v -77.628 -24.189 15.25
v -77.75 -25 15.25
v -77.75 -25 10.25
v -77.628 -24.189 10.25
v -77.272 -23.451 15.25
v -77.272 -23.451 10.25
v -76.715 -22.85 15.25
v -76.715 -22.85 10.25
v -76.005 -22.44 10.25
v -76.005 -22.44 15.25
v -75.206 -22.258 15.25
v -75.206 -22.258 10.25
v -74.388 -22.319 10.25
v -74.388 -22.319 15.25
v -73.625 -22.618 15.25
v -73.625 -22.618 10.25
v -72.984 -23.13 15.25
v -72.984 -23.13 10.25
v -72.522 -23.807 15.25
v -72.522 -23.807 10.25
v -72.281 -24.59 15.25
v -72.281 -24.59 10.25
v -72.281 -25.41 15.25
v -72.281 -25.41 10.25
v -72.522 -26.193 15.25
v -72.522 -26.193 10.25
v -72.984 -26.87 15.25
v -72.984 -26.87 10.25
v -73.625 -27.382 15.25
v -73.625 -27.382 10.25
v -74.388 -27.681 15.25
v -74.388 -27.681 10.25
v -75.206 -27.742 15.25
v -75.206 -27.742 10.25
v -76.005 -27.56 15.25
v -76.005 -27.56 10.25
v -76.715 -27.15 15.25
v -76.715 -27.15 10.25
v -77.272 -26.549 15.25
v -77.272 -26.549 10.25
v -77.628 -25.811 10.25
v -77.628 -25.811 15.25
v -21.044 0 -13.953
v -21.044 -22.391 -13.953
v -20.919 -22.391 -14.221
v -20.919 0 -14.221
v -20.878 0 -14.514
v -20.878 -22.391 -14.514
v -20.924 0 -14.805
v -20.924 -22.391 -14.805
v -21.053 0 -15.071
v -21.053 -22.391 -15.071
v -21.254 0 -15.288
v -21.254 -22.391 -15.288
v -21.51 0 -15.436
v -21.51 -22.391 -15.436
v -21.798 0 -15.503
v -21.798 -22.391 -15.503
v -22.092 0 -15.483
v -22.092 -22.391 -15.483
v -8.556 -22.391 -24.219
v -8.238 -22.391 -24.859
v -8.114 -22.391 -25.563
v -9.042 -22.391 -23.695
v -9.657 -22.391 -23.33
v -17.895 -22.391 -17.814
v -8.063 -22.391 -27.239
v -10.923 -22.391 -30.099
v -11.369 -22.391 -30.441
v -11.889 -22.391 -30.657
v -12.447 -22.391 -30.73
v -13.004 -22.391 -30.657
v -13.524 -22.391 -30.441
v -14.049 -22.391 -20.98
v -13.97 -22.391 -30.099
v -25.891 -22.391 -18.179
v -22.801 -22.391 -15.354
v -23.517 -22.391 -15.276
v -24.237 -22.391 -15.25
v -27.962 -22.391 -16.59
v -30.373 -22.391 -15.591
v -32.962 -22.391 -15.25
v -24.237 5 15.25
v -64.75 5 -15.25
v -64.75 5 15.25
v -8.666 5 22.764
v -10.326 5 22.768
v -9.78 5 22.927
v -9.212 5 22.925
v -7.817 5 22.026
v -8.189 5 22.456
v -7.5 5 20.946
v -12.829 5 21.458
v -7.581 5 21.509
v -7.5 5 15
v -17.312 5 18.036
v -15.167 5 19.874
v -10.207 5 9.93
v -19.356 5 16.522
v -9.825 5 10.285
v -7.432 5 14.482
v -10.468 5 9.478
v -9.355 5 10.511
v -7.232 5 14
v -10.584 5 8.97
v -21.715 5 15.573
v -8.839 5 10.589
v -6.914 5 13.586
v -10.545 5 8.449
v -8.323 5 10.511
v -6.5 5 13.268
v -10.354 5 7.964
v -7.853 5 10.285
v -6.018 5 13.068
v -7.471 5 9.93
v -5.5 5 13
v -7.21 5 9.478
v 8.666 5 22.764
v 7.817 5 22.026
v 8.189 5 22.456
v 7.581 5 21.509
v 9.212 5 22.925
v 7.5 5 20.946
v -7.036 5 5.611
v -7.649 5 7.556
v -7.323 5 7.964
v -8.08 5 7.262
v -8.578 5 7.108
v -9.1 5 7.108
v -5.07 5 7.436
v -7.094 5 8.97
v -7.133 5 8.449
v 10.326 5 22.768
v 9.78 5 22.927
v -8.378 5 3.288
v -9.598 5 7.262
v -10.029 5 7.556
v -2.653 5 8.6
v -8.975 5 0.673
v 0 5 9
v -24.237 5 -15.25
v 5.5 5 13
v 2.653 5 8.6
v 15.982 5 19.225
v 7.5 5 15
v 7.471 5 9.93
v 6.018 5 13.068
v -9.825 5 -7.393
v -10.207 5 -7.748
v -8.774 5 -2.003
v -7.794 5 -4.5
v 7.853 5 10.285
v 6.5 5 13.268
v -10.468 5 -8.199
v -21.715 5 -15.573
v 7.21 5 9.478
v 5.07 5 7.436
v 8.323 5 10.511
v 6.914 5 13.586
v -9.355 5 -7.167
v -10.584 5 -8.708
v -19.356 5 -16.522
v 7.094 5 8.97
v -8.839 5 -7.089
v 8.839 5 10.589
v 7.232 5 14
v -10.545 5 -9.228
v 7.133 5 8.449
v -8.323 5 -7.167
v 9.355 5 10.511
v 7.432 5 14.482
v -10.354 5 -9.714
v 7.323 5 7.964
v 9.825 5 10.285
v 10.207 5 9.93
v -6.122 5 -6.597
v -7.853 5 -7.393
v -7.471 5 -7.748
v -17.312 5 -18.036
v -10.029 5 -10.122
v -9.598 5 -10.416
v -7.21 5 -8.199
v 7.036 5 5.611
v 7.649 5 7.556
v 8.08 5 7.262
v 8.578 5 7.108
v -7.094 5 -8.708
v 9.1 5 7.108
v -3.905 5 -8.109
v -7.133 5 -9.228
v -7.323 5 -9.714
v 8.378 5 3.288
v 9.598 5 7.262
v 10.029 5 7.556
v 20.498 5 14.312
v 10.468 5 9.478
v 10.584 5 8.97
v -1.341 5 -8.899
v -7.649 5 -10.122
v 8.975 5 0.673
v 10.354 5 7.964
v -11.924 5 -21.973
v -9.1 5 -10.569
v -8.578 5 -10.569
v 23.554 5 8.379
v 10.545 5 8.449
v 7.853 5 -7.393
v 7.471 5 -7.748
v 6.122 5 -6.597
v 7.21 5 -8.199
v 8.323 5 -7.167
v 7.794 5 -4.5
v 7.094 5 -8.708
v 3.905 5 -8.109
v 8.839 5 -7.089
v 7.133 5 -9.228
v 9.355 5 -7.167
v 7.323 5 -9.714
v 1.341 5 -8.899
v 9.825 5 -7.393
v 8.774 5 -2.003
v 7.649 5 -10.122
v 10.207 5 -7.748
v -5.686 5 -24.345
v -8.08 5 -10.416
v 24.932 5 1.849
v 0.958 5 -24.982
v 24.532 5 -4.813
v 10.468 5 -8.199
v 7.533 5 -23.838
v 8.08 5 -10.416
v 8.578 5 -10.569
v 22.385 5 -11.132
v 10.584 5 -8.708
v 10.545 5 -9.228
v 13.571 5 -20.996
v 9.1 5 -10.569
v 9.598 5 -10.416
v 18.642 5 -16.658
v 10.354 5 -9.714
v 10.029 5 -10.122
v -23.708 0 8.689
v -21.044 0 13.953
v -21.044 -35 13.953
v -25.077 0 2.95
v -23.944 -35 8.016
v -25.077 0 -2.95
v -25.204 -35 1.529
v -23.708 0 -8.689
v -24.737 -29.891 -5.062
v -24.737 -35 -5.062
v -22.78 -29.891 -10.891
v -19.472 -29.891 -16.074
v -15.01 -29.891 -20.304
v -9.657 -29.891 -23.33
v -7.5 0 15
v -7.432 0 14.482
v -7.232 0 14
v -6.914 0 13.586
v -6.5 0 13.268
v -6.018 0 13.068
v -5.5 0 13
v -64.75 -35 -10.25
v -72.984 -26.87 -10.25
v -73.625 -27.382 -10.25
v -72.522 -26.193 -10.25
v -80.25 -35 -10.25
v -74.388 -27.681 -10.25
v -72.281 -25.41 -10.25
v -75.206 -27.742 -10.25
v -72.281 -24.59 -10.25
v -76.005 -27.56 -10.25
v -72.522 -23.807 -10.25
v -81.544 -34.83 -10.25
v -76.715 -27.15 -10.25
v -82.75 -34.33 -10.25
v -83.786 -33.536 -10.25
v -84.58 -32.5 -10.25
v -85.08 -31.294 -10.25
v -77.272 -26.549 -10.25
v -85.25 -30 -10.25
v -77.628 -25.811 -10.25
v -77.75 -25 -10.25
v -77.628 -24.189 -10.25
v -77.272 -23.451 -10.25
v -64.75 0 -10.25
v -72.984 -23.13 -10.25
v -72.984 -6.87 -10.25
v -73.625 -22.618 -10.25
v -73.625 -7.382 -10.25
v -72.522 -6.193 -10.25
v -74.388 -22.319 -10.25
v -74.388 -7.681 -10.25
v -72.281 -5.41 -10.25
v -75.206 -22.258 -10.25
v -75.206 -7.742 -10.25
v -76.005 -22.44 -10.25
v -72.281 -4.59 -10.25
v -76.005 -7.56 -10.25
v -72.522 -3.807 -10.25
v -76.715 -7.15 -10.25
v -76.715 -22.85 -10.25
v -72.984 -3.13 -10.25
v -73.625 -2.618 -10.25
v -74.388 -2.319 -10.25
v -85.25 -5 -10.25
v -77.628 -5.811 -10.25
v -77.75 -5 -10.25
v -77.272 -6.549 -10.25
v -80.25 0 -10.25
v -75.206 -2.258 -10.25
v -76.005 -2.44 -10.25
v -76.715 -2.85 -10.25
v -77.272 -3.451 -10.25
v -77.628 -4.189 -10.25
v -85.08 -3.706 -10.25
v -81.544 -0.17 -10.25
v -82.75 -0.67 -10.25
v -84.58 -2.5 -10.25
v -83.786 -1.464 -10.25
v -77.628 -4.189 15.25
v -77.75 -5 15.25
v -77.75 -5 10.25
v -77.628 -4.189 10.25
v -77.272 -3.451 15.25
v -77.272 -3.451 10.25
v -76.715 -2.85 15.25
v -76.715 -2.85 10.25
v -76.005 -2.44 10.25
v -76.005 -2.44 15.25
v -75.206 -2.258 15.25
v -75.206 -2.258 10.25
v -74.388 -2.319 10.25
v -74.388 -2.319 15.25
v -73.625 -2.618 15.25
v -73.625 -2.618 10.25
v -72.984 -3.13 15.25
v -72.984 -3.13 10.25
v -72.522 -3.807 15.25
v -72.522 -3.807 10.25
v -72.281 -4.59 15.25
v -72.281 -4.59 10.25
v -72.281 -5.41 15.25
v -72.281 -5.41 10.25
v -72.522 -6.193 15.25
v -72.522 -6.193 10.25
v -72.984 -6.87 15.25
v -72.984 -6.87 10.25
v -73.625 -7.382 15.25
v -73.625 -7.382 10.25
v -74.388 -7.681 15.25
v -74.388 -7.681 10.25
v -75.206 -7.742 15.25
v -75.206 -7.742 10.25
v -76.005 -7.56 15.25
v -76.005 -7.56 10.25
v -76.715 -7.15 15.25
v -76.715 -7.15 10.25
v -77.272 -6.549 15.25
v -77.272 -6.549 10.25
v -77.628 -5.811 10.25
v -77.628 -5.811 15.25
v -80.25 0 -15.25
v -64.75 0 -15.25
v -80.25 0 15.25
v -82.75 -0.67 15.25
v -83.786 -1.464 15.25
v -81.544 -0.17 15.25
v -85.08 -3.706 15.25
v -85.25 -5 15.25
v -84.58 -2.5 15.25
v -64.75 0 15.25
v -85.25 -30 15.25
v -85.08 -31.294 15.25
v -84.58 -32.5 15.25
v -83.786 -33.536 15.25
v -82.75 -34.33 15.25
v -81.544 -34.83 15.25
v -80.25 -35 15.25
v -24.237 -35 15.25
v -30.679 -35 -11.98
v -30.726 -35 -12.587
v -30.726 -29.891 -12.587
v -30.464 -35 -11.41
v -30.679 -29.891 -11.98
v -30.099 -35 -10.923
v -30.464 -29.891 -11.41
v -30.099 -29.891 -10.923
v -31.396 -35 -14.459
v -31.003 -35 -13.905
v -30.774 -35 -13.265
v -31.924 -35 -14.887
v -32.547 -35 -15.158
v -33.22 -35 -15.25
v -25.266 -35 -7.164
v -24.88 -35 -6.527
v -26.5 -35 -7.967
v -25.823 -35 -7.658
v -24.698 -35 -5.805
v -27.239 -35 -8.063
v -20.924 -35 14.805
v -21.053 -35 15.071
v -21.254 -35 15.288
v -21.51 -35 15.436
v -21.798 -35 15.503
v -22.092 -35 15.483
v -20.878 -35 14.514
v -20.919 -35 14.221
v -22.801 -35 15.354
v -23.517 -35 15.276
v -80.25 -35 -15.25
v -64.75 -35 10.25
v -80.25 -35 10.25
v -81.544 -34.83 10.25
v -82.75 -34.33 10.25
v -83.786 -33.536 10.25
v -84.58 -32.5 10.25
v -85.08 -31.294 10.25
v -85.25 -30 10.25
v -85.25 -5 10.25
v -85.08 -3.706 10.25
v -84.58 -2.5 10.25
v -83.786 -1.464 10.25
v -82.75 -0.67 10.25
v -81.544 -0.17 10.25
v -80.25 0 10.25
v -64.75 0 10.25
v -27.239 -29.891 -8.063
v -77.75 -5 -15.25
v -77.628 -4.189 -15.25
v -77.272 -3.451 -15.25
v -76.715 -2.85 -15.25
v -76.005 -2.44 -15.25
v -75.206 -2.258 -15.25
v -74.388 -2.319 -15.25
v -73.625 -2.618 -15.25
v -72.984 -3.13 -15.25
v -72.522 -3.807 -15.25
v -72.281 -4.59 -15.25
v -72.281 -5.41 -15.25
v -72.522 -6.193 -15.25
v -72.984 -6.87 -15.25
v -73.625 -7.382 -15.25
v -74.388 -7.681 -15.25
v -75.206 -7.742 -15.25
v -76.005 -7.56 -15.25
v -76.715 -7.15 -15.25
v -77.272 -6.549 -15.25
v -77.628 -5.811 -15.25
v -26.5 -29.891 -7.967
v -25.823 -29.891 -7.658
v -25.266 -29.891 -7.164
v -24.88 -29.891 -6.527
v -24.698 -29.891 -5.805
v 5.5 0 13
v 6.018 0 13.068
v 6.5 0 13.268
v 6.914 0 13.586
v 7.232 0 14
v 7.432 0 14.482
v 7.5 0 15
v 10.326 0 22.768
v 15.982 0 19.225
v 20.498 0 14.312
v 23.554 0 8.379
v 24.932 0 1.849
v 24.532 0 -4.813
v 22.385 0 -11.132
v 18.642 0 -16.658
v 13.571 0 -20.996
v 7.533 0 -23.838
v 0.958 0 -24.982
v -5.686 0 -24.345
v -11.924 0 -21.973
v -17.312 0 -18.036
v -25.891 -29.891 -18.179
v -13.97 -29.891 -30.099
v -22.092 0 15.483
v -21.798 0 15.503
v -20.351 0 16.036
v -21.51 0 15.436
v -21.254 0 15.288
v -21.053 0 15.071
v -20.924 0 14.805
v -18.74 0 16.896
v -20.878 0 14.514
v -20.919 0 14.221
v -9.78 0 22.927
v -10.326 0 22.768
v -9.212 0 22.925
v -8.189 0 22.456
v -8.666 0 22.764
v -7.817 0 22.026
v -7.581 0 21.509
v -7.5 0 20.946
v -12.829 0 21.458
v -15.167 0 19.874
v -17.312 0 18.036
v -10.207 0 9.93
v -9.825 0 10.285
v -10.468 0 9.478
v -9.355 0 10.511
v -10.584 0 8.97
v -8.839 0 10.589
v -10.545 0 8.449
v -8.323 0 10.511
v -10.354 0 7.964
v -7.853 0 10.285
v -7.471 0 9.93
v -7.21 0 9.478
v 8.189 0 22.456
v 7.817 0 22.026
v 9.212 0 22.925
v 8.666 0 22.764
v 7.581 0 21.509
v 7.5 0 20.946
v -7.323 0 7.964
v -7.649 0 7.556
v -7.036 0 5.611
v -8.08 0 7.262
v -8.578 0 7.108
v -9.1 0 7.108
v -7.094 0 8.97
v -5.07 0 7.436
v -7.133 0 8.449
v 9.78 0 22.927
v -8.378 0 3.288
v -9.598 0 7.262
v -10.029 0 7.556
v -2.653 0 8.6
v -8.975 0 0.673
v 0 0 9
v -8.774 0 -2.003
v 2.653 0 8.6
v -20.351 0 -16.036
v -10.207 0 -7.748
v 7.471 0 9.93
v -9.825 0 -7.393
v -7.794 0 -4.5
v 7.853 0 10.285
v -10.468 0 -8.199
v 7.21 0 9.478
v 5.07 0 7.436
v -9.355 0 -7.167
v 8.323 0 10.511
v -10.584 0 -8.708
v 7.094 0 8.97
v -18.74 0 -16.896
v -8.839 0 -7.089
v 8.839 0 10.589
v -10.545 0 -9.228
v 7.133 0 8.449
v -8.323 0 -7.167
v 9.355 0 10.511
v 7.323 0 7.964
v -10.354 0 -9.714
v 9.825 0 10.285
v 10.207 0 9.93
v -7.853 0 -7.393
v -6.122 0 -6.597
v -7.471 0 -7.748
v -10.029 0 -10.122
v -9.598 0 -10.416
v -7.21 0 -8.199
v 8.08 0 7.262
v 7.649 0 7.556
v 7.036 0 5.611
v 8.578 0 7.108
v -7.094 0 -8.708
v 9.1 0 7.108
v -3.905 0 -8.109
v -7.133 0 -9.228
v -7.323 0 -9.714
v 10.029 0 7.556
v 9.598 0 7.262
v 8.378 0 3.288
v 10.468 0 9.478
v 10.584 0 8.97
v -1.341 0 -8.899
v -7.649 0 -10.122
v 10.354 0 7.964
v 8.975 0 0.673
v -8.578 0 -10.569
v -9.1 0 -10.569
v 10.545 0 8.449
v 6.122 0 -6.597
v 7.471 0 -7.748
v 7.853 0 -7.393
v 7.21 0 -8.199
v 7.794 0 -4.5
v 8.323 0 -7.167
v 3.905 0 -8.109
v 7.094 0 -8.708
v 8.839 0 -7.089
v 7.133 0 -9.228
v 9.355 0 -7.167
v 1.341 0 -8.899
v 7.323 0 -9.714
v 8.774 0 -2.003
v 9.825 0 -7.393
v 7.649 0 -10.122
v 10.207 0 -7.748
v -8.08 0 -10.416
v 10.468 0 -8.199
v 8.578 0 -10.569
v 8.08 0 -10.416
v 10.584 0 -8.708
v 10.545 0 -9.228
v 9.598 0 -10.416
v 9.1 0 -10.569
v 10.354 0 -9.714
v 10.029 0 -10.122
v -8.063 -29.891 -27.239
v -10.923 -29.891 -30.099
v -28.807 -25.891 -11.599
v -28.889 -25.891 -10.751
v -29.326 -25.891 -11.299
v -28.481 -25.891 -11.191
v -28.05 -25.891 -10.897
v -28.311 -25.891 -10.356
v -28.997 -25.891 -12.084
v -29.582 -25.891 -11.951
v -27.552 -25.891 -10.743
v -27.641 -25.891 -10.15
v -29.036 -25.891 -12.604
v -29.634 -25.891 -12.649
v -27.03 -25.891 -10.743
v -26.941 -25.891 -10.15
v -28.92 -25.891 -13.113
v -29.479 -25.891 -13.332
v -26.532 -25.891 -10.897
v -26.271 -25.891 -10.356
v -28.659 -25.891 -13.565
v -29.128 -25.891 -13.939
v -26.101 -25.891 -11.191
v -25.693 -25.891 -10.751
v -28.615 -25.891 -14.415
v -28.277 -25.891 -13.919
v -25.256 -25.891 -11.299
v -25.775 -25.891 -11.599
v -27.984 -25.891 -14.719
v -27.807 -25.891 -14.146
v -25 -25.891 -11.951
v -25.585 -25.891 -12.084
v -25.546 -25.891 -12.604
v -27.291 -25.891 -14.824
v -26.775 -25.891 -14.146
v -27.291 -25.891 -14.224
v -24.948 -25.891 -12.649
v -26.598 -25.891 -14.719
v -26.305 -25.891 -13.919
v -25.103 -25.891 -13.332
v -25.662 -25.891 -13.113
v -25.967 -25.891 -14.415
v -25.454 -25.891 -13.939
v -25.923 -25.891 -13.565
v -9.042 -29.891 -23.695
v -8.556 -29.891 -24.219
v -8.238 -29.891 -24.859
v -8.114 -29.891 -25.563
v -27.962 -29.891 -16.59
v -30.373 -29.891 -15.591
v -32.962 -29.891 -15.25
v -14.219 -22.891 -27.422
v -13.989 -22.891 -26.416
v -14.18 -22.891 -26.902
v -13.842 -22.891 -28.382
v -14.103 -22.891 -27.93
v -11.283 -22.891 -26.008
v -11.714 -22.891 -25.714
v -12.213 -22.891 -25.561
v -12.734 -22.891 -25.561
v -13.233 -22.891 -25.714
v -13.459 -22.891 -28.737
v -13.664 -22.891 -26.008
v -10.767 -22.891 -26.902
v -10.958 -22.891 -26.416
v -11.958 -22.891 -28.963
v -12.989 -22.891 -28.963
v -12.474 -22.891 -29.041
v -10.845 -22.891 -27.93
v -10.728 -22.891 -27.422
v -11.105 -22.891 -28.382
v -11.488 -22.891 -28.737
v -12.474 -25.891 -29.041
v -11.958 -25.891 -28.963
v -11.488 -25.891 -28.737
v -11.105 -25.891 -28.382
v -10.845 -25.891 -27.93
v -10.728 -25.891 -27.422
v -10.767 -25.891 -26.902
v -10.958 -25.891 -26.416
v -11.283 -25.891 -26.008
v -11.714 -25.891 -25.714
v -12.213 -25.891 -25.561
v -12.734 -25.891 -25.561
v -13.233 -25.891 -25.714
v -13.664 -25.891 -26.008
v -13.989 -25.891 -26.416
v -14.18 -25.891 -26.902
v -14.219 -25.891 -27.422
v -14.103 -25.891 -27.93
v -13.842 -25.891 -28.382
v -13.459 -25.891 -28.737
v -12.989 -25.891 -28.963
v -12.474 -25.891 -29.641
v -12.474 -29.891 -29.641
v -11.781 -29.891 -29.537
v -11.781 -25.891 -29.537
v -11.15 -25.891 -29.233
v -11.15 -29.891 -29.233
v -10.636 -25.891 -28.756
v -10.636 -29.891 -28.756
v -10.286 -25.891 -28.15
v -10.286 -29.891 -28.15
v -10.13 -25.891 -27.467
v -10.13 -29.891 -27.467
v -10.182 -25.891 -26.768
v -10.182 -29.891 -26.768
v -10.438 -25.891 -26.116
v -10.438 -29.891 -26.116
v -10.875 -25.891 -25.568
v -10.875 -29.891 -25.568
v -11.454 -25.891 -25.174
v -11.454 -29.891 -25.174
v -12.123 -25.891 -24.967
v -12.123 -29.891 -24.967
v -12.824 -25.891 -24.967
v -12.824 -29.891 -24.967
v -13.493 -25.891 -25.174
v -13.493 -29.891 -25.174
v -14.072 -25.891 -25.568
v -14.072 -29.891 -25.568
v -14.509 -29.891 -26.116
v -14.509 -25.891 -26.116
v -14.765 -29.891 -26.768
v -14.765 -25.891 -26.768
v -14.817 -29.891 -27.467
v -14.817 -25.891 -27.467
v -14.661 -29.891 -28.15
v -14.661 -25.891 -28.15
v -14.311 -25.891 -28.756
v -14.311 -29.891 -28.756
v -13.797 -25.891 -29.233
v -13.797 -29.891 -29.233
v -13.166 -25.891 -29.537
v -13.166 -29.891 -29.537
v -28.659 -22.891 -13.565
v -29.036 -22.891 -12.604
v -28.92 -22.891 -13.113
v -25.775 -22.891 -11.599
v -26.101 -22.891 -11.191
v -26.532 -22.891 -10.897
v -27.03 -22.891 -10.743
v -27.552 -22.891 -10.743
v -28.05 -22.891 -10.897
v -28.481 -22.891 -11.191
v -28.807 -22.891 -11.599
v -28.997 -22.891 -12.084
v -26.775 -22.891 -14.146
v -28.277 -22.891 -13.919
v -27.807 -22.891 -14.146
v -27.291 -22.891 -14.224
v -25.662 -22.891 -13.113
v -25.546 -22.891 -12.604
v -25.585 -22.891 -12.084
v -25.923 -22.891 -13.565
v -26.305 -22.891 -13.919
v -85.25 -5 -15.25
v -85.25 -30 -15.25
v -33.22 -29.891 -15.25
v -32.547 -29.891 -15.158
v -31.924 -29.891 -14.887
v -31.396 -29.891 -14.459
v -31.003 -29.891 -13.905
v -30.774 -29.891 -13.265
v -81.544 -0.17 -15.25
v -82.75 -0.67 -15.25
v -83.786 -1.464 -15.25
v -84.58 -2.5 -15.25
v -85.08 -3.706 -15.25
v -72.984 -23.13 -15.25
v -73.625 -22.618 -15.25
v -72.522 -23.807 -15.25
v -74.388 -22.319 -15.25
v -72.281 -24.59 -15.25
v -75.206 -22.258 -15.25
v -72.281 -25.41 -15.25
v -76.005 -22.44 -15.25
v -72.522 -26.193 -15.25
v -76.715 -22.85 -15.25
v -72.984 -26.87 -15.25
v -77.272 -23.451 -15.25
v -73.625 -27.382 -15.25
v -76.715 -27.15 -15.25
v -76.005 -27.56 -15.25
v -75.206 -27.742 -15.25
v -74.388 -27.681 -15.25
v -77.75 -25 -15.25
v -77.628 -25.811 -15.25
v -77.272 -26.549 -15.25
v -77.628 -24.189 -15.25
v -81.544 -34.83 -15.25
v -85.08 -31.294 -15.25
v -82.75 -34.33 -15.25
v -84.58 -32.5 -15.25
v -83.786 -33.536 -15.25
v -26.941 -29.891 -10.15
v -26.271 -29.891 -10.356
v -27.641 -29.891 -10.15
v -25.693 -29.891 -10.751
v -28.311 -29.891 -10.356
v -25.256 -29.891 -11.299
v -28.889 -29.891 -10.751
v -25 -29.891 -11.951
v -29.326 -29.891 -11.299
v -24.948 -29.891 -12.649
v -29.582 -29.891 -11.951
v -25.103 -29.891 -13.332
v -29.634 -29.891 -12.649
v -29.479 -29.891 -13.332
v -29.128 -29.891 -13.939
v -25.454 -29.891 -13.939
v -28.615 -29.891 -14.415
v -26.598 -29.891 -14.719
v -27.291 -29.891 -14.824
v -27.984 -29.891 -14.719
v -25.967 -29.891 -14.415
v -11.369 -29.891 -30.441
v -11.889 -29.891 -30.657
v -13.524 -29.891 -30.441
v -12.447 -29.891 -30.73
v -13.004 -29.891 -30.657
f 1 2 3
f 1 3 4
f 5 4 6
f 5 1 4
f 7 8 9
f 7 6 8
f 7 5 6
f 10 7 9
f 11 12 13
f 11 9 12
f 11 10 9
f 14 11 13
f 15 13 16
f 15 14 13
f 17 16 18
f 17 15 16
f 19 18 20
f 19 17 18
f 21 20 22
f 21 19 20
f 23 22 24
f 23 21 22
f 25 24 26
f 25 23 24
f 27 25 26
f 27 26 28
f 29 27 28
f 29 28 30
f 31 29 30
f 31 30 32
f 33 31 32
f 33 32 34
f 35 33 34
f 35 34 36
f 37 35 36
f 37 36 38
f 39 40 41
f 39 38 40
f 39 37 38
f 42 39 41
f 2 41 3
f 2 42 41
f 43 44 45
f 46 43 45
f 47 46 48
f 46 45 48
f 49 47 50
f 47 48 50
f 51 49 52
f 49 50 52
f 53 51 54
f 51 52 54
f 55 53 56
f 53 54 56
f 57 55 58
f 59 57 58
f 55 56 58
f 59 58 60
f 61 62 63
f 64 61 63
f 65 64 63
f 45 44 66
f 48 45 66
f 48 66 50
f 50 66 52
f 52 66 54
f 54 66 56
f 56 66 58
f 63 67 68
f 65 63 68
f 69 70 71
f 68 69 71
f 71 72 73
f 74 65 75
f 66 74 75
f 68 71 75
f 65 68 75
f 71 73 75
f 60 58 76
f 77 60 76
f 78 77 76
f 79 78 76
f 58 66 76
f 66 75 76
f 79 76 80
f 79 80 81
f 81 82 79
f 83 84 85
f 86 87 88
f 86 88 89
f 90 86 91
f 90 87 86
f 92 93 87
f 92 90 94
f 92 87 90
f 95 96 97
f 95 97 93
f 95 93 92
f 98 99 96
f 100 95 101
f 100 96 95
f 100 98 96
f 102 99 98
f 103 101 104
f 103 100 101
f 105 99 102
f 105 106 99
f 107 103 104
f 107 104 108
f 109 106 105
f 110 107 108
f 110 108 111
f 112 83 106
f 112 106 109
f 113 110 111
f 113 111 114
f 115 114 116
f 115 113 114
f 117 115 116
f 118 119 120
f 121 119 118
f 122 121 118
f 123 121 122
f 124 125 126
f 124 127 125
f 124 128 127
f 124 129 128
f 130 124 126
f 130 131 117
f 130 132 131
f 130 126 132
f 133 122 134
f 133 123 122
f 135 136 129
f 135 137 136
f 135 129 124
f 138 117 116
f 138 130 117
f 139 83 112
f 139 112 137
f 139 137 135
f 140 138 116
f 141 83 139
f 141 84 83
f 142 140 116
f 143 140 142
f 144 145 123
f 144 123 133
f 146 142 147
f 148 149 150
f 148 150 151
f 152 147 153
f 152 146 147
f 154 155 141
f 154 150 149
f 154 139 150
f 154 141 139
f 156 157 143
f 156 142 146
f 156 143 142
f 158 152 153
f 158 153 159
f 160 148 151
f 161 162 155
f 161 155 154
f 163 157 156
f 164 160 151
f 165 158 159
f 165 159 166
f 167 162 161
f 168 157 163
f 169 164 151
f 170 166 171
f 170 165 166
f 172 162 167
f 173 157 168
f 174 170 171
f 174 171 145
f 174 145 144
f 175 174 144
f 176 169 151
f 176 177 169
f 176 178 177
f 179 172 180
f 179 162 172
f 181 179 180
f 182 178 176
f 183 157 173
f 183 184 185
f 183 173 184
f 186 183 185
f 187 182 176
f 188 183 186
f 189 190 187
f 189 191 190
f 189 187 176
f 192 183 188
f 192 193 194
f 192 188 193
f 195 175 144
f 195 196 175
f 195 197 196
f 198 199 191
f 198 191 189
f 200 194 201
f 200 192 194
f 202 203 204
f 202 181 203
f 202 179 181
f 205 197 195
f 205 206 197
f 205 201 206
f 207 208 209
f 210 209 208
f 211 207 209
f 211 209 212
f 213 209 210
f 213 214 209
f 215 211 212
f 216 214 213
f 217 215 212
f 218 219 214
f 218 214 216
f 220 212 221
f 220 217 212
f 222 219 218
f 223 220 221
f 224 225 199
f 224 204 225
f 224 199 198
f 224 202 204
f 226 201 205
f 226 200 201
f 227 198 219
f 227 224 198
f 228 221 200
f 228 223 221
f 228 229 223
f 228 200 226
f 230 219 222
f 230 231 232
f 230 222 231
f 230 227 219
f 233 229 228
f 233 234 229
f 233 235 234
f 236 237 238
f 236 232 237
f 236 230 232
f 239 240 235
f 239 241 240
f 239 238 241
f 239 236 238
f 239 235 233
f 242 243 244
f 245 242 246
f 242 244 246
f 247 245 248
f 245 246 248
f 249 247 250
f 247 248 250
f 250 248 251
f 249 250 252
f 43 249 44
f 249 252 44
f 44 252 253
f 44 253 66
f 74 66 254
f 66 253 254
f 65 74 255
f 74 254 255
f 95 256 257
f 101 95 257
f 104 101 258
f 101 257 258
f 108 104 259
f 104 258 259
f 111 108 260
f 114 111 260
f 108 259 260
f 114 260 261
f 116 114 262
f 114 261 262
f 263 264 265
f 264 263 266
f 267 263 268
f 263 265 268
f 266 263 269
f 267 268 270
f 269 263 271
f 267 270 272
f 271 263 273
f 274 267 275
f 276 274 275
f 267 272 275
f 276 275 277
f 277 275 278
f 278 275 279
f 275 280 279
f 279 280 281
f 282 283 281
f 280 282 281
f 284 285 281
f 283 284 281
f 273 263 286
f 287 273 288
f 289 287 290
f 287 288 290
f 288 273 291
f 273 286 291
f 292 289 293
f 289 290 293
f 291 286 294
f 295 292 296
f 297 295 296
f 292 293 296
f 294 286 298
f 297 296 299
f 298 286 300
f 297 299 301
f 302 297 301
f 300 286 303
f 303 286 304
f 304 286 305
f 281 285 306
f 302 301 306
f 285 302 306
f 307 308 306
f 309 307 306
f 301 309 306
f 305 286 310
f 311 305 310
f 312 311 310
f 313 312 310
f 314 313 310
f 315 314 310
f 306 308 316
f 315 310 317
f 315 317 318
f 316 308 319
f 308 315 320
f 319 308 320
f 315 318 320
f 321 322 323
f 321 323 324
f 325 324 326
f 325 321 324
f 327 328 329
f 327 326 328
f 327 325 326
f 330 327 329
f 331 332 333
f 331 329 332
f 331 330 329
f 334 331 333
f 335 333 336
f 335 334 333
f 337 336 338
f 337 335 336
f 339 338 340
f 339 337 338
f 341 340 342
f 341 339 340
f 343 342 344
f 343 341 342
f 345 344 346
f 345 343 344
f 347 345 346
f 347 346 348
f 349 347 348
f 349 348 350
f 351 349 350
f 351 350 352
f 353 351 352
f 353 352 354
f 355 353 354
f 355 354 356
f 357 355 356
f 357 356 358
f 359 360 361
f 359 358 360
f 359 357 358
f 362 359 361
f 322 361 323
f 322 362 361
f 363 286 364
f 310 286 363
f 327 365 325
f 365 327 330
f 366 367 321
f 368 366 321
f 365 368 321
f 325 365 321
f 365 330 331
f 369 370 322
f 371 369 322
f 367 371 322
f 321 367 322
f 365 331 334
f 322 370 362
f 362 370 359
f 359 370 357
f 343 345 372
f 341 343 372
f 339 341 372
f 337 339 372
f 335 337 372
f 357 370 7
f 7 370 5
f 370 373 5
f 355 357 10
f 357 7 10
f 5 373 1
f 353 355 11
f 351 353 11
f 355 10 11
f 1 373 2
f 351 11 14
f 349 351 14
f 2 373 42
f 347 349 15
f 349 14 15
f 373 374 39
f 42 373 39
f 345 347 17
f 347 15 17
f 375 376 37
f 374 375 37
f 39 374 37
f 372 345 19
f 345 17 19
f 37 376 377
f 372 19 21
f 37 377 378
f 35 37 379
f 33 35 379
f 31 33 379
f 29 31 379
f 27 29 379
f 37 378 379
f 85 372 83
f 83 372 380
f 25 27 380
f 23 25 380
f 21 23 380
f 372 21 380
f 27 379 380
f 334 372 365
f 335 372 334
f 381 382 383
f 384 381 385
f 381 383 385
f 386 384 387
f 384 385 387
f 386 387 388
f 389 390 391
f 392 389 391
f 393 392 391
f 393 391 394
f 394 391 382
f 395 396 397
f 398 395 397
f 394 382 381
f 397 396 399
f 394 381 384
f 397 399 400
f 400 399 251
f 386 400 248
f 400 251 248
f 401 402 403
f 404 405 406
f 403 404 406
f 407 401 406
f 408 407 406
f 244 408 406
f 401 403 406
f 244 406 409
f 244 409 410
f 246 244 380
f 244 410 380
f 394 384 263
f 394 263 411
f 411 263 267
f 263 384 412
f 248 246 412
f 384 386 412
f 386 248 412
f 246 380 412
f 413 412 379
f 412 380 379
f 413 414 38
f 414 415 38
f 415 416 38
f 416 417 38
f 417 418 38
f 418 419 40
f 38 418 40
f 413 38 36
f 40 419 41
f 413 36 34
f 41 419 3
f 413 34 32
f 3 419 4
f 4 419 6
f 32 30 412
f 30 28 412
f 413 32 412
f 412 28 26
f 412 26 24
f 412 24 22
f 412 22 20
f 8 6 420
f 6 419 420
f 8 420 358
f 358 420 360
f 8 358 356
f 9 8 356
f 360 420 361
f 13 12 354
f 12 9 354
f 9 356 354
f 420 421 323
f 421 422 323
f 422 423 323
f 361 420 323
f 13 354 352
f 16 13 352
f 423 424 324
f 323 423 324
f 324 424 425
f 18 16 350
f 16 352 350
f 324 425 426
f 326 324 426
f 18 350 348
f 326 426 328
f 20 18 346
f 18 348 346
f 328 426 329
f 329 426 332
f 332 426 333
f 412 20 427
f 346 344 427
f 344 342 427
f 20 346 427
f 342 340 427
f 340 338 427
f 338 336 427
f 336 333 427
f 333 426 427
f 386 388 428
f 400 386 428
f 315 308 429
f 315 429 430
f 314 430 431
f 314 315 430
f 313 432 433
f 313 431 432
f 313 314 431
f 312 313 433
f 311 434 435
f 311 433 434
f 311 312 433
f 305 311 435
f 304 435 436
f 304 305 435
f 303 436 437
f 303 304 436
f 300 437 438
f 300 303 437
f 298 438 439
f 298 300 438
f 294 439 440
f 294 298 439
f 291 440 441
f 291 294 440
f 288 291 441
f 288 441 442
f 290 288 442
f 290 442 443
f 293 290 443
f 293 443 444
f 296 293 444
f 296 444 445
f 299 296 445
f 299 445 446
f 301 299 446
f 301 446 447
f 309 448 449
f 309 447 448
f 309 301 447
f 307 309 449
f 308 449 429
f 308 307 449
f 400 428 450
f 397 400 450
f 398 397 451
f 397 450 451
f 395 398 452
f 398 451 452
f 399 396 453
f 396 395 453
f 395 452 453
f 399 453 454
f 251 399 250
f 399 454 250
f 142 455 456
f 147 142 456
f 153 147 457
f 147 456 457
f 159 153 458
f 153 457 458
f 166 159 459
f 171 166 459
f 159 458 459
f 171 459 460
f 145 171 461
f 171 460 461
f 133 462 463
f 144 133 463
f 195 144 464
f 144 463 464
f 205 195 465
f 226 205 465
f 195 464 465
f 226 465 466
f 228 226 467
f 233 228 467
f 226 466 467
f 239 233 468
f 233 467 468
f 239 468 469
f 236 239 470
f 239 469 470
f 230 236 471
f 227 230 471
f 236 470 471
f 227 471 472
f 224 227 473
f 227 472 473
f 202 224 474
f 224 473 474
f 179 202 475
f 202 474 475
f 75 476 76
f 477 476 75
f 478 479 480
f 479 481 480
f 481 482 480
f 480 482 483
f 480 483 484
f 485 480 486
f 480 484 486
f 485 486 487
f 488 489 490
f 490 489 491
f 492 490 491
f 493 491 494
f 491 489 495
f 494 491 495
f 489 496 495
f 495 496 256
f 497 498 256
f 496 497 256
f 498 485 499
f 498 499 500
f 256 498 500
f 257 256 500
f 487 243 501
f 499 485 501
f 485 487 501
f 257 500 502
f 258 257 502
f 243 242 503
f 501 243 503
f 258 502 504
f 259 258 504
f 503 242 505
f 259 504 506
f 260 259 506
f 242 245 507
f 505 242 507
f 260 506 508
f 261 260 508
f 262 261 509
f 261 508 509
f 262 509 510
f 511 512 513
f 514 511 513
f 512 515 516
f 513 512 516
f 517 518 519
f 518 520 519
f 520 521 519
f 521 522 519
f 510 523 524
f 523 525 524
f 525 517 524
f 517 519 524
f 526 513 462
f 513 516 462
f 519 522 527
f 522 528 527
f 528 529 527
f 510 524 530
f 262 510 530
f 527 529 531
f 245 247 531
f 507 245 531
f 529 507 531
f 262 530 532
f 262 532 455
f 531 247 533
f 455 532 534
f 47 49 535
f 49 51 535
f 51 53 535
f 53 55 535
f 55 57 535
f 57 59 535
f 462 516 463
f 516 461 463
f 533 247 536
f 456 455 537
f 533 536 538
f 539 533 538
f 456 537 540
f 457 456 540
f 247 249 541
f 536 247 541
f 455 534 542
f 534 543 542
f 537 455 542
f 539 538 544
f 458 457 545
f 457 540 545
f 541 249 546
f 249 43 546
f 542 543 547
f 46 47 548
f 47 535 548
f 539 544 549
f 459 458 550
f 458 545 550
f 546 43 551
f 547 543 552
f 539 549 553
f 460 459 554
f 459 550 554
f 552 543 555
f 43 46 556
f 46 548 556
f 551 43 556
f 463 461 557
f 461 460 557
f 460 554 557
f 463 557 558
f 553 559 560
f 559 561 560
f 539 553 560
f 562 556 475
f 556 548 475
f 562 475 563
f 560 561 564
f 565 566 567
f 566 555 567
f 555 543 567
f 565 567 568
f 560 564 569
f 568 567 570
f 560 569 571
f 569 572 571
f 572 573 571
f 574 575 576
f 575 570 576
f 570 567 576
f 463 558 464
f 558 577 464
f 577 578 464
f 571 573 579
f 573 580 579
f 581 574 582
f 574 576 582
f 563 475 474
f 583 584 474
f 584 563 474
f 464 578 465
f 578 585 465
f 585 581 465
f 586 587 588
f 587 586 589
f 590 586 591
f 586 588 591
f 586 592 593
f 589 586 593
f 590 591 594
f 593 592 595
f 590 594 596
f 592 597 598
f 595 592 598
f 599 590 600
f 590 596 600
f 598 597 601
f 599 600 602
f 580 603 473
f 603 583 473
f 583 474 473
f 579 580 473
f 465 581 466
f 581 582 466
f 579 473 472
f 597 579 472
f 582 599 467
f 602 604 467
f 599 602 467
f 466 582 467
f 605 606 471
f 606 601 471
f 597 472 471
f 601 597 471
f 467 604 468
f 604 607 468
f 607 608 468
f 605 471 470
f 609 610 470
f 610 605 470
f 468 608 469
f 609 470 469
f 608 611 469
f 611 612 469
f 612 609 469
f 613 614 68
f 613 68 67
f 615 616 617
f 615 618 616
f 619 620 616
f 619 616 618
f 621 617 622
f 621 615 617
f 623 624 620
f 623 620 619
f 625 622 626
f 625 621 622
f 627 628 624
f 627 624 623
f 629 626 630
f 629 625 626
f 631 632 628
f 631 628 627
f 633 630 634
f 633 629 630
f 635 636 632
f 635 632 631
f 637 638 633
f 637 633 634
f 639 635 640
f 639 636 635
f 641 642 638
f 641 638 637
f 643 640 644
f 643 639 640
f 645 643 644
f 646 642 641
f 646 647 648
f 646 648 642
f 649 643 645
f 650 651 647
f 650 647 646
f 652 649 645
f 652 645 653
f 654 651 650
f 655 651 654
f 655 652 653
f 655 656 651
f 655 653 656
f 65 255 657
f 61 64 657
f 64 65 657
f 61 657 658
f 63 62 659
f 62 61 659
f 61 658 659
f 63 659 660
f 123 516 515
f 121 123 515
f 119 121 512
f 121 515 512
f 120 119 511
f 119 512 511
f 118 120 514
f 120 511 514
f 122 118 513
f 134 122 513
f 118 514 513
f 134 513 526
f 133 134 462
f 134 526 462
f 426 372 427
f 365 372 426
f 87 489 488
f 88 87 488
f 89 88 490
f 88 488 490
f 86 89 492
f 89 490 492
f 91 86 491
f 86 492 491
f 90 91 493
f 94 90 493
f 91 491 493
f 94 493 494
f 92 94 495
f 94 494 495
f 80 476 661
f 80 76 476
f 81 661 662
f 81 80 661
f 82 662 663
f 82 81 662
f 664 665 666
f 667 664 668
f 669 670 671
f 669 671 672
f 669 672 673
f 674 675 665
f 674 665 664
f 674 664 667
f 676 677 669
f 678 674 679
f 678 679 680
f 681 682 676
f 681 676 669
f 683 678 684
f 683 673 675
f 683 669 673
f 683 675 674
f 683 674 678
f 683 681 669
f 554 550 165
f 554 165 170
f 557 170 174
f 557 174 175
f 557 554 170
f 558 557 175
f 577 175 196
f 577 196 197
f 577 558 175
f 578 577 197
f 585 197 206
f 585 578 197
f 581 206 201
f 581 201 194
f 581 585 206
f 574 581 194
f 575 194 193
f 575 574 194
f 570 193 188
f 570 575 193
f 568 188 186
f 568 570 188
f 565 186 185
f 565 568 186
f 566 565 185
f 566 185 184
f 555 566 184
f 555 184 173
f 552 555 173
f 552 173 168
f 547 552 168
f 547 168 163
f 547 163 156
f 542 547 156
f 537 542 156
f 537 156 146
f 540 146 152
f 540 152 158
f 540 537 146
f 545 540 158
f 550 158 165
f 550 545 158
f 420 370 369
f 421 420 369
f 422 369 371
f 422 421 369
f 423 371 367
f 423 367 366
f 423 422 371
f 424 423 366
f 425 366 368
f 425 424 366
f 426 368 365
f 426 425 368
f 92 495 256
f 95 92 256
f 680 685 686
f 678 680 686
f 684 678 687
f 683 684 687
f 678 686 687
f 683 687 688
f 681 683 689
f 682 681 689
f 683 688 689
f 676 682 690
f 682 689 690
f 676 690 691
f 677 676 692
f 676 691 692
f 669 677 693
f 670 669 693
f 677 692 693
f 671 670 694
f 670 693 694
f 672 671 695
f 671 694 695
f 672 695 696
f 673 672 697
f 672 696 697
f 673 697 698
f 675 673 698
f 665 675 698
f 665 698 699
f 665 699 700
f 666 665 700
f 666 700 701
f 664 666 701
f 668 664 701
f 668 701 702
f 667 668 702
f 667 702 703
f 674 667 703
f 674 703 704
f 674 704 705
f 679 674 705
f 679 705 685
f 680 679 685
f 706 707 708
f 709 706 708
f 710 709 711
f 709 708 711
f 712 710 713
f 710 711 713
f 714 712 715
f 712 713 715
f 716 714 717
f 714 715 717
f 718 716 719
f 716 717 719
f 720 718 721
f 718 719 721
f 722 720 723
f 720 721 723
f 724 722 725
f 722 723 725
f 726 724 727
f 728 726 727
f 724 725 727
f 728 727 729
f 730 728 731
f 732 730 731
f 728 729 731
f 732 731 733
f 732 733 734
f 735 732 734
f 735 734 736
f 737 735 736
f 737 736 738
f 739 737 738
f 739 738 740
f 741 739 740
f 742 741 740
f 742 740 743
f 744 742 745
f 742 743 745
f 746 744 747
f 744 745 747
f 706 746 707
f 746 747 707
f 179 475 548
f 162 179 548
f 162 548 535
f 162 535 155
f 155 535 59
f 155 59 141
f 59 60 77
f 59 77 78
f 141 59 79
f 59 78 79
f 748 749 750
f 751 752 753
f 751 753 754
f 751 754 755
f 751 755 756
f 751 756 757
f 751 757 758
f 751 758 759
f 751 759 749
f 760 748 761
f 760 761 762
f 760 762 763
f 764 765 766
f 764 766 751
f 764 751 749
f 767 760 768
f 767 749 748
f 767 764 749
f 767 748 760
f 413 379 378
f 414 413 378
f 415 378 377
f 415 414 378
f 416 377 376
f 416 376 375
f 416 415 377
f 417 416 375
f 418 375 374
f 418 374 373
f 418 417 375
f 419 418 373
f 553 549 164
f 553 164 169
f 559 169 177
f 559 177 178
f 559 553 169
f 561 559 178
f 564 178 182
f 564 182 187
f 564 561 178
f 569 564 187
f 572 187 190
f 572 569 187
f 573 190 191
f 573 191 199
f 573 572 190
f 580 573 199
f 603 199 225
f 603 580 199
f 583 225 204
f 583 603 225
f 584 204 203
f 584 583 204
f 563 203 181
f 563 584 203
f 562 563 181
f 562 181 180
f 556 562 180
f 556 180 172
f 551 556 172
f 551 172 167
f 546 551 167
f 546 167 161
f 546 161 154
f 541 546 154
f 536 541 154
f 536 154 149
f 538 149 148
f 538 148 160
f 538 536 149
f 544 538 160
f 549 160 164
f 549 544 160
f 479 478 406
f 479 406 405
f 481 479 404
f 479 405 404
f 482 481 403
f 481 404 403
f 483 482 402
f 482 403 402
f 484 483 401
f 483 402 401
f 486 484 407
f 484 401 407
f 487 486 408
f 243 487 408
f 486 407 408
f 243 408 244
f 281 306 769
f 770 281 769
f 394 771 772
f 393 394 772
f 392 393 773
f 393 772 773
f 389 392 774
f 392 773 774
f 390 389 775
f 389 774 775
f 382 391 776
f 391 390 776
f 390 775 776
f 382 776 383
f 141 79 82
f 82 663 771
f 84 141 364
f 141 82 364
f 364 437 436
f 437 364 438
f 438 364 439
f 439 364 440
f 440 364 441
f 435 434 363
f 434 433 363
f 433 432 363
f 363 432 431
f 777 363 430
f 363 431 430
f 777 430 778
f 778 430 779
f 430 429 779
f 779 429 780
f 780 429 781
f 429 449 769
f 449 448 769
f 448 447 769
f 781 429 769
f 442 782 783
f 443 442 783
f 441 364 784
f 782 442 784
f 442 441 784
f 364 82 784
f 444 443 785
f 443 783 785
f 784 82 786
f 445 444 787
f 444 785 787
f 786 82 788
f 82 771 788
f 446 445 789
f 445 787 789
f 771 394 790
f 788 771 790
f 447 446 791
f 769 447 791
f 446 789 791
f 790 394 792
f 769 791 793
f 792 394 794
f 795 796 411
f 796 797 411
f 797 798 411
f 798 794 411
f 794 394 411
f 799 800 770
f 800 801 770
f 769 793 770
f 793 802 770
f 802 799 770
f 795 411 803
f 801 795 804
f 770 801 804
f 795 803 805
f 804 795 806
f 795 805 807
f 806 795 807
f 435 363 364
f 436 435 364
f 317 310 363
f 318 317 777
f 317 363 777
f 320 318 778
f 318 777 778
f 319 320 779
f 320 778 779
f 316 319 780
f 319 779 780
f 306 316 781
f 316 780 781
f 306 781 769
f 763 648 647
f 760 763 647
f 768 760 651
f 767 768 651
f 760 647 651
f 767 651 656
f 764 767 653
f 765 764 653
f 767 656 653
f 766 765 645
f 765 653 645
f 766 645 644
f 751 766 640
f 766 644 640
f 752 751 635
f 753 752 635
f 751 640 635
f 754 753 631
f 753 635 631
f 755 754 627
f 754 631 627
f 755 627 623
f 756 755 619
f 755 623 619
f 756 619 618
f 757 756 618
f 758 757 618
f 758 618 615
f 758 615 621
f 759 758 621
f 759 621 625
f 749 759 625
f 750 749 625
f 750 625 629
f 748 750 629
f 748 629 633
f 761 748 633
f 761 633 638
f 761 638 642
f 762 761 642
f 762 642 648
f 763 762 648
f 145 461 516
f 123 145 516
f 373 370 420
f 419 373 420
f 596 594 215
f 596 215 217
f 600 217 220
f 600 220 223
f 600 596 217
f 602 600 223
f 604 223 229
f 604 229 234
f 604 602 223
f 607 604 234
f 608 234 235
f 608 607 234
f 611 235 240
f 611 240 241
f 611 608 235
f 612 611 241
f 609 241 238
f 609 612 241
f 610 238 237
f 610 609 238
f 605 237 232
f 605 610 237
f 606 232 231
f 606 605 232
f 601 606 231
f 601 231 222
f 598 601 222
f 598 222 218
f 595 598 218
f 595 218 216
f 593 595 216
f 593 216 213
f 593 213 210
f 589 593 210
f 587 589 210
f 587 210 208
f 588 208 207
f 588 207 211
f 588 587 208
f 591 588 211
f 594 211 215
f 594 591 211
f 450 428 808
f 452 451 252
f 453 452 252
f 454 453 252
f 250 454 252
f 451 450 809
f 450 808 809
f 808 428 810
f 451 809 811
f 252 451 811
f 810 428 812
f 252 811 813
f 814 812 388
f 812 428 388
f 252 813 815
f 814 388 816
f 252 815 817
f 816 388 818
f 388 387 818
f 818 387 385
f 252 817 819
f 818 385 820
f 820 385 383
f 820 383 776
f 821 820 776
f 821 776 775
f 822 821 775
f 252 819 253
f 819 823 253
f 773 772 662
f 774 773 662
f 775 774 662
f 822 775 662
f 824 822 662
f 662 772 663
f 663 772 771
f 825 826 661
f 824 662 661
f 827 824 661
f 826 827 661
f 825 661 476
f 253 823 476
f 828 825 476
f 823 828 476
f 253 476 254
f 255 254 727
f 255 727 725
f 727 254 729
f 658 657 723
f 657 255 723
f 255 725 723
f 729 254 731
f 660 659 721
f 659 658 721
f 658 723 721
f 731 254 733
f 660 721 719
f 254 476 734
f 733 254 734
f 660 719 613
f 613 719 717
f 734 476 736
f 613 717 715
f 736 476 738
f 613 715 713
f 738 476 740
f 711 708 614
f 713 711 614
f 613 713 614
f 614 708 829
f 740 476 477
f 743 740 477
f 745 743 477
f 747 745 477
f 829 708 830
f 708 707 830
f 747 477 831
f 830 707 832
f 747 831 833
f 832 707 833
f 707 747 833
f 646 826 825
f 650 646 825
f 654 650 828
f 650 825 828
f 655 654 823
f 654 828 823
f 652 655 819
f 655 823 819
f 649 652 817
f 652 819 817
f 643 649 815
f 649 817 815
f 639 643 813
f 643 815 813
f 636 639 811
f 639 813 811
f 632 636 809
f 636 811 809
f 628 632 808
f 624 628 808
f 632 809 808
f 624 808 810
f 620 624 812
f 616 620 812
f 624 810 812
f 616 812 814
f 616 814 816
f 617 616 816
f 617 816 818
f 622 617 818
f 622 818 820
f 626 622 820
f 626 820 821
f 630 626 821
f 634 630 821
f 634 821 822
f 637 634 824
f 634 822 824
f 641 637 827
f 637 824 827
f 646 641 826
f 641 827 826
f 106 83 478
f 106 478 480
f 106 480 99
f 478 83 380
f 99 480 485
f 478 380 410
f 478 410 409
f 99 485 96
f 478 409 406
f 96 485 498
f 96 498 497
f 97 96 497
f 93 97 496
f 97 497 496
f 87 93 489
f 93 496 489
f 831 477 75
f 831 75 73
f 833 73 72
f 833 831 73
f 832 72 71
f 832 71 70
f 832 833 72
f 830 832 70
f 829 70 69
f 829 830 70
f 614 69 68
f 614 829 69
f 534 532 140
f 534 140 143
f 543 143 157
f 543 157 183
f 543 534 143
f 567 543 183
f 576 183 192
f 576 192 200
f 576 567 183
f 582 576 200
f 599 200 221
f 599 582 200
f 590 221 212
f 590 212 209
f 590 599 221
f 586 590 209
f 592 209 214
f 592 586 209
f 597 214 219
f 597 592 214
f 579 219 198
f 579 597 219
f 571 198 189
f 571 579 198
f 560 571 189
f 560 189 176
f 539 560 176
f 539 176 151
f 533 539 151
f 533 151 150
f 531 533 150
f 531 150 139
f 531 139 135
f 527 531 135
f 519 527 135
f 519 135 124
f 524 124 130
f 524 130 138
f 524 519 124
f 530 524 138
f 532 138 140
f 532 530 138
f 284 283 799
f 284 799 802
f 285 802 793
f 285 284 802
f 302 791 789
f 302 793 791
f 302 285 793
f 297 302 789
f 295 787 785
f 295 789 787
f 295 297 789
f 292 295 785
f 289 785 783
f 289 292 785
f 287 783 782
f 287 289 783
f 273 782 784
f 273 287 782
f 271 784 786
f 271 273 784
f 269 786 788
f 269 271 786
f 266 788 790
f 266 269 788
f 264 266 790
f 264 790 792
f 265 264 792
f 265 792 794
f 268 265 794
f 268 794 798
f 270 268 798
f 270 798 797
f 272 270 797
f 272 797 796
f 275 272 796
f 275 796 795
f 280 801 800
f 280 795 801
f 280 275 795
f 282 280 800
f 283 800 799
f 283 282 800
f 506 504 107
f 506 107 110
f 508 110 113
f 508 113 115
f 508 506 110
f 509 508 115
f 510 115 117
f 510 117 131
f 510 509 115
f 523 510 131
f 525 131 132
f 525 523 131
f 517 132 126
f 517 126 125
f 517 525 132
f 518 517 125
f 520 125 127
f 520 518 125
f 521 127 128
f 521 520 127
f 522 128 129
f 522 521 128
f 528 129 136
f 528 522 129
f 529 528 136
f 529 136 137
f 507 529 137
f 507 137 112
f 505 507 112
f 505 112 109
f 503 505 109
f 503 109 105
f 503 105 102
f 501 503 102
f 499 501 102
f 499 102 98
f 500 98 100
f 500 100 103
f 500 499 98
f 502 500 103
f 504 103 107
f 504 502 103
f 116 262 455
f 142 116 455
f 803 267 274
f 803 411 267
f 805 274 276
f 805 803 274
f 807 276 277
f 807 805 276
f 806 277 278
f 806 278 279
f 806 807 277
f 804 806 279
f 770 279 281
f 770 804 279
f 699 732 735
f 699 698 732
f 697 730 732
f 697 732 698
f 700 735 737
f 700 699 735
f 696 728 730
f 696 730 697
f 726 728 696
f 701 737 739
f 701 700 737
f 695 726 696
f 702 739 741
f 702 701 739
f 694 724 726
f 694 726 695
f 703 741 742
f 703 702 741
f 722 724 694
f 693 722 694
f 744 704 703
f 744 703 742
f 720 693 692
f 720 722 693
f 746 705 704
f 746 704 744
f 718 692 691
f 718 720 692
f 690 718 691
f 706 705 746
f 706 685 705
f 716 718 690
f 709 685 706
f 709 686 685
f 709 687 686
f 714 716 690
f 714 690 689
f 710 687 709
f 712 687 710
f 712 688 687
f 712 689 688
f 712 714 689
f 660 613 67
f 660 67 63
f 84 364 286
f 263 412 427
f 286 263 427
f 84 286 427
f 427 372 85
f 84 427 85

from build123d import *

# Parameters (mm, degrees)
SKETCH1_R               = 1.7499999999999998
SKETCH1_R_2             = 9
MOTOR_PLATE_DEPTH       = 5
BOSS_EXTRUDE1_DEPTH     = 35
BOSS_EXTRUDE2_START     = 35
BOSS_EXTRUDE2_DEPTH     = 35
CUT_EXTRUDE5_DEPTH      = 100.75732766200707
CUT_EXTRUDE5_DEPTH_BACK = 100.75732766200707
SKETCH11_R              = 2.7500000000000084
SKETCH11_R_2            = 2.750000000000008
CUT_EXTRUDE7_DEPTH      = 100.75732766200707
CUT_EXTRUDE7_DEPTH_BACK = 100.75732766200707
SKETCH14_W              = 20.499999999999986
SKETCH14_H              = 5
FILLET4_R               = 5
BOSS_EXTRUDE5_DEPTH     = 7.5
CUT_EXTRUDE14_DEPTH     = 98.1044493253111
SKETCH27_R              = 2.3500000000000005
CUT_EXTRUDE15_DEPTH     = 4
SKETCH28_R              = 1.7499999999999998
SKETCH28_R_2            = 1.7500000000000004
CUT_EXTRUDE16_DEPTH     = 7
FILLET5_R               = 2.5
FILLET6_R               = 10


with BuildPart() as part:
    # Sketch1 → Motor Plate (new body)
    with BuildSketch(Plane(origin=(0, 0, 0), x_dir=(1, 0, 0), z_dir=(0, 1, 0))):
        with BuildLine():
            Line((-24.237109976232734, 15.250000000000002), (-85.24999999999999, 15.25))
            Line((-85.24999999999999, 15.25), (-85.24999999999999, 10.25))
            Line((-85.24999999999999, 10.25), (-64.75, 10.25))
            Line((-64.75, 10.25), (-64.75, -10.250000000000002))
            Line((-64.75, -10.250000000000002), (-85.24999999999999, -10.250000000000002))
            Line((-85.24999999999999, -10.250000000000002), (-85.24999999999999, -15.250000000000002))
            Line((-85.24999999999999, -15.250000000000002), (-24.237109976232734, -15.25))
            ThreePointArc((-24.237109976232734, -15.25), (-20.505009839771837, -15.972531133362475), (-17.31222141159481, -18.03571428571429))
            ThreePointArc((-17.31222141159481, -18.03571428571429), (-14.020240375434447, -20.698619756279353), (-10.326086956521745, -22.76778268005806))
            ThreePointArc((-10.326086956521745, -22.76778268005806), (-8.416527322228076, -22.627457016016997), (-7.500000000000001, -20.94636006565341))
            Line((-7.500000000000001, -20.94636006565341), (-7.500000000000001, -15))
            ThreePointArc((-7.500000000000001, -15), (-6.914213562373096, -13.585786437626904), (-5.500000000000001, -13))
            Line((-5.500000000000001, -13), (5.499999999999999, -13))
            ThreePointArc((5.499999999999999, -13), (6.914213562373094, -13.585786437626904), (7.499999999999999, -15))
            Line((7.499999999999999, -15), (7.499999999999999, -20.94636006565341))
            ThreePointArc((7.499999999999999, -20.94636006565341), (8.416527322228072, -22.627457016016997), (10.32608695652174, -22.76778268005806))
            ThreePointArc((10.32608695652174, -22.76778268005806), (20.698619756279356, 14.020240375434444), (-17.31222141159481, 18.035714285714285))
            ThreePointArc((-17.31222141159481, 18.035714285714285), (-20.50500983977184, 15.972531133362477), (-24.237109976232734, 15.250000000000002))
        make_face()
        with Locations(Location((8.838834764831846, 8.838834764831835, 0), (0, 0, 270))):
            Circle(SKETCH1_R, mode=Mode.SUBTRACT)
        with Locations(Location((-8.838834764831843, 8.838834764831846, 0), (0, 0, 270))):
            Circle(SKETCH1_R, mode=Mode.SUBTRACT)
        with Locations(Location((-8.838834764831843, -8.838834764831846, 0), (0, 0, 270))):
            Circle(SKETCH1_R, mode=Mode.SUBTRACT)
        with Locations(Location((8.838834764831846, -8.838834764831835, 0), (0, 0, 270))):
            Circle(SKETCH1_R, mode=Mode.SUBTRACT)
        with Locations(Location((0, 0, 0), (0, 0, 270))):
            Circle(SKETCH1_R_2, mode=Mode.SUBTRACT)
    extrude(amount=MOTOR_PLATE_DEPTH)

    # Sketch3 → Boss-Extrude1 (add)
    with BuildSketch(Plane.XZ):
        Polygon((-85.24999999999999, 15.250000000000002), (-85.24999999999999, 10.250000000000002), (-64.75, 10.250000000000002), (-64.75, -10.25), (-85.24999999999999, -10.25), (-85.24999999999999, -15.25), (-59.75, -15.25), (-59.75, 15.250000000000002), align=None)
    extrude(amount=BOSS_EXTRUDE1_DEPTH)

    # Sketch4 → Boss-Extrude2 (add)
    with BuildSketch(Plane.XZ.offset(BOSS_EXTRUDE2_START)):
        with BuildLine():
            Line((-59.75, -15.25), (-59.75, 15.250000000000002))
            Line((-59.75, 15.250000000000002), (-24.237109976232734, 15.25))
            ThreePointArc((-24.237109976232734, 15.25), (-23.15840811564324, 15.30835012203906), (-22.09229473209558, 15.482719540807848))
            ThreePointArc((-22.09229473209558, 15.482719540807848), (-21.052891601024875, 15.071238646911935), (-21.04437270453208, 13.953382295083351))
            ThreePointArc((-21.04437270453208, 13.953382295083351), (-25.250000000000007, 3.09e-15), (-21.044372704532076, -13.953382295083353))
            ThreePointArc((-21.044372704532076, -13.953382295083353), (-21.05289160102487, -15.071238646911937), (-22.092294732095578, -15.48271954080785))
            ThreePointArc((-22.092294732095578, -15.48271954080785), (-23.15840811564324, -15.308350122039062), (-24.237109976232734, -15.25))
            Line((-24.237109976232734, -15.25), (-59.75, -15.25))
        make_face()
    extrude(amount=-BOSS_EXTRUDE2_DEPTH)

    # Sketch11 → Cut-Extrude5 (cut, two sides: drawn at the far end of the back side and taken through both)
    with BuildSketch(Plane(origin=(-4.3e-16, 0, -15.250000000000002), x_dir=(-1, 0, 6e-17), z_dir=(-6e-17, 0, -1)).offset(-CUT_EXTRUDE5_DEPTH_BACK)):
        with Locations((75, -25)):
            Circle(SKETCH11_R)
        with Locations((75, -5.000000000000001)):
            Circle(SKETCH11_R_2)
    extrude(amount=CUT_EXTRUDE5_DEPTH + CUT_EXTRUDE5_DEPTH_BACK, mode=Mode.SUBTRACT)

    # Sketch14 → Cut-Extrude7 (cut, two sides: drawn at the far end of the back side and taken through both)
    with BuildSketch(Plane(origin=(-4.3e-16, 0, -15.250000000000002), x_dir=(-1, 0, 6e-17), z_dir=(-6e-17, 0, -1)).offset(-CUT_EXTRUDE7_DEPTH_BACK)):
        with Locations((75, 2.5)):
            Rectangle(SKETCH14_W, SKETCH14_H)
    extrude(amount=CUT_EXTRUDE7_DEPTH + CUT_EXTRUDE7_DEPTH_BACK, mode=Mode.SUBTRACT)

    # Fillet4
    fillet4_edges = [part.edges().sort_by_distance(p)[0] for p in [
        (-85.24999999999999, 0, -12.75),
        (-85.24999999999999, 0, 12.75),
        (-85.24999999999999, -35, -12.75),
        (-85.24999999999999, -35, 12.750000000000002),
    ]]
    fillet(fillet4_edges, radius=FILLET4_R)

    # Sketch24 → Boss-Extrude5 (add)
    with BuildSketch(Plane(origin=(0, -29.8908, 0), x_dir=(-1, 0, 0), z_dir=(0, -1, 0))):
        with BuildLine():
            Line((24.237109976232734, 15.25), (28.819440187957916, 15.25))
            Line((28.819440187957916, 15.25), (13.970450097258862, 30.09899009069905))
            ThreePointArc((13.970450097258862, 30.09899009069905), (12.44663498380185, 30.730174977242044), (10.92281987034484, 30.09899009069905))
            Line((10.92281987034484, 30.09899009069905), (8.062504135197518, 27.238674355551726))
            Line((8.062504135197518, 27.238674355551726), (8.165668965896261, 23.893186274320946))
            ThreePointArc((8.165668965896261, 23.893186274320946), (15.42746120991581, 19.988895432628166), (21.044372704532083, 13.95338229508334))
            ThreePointArc((21.044372704532083, 13.95338229508334), (21.052891601024868, 15.07123864691193), (22.092294732095578, 15.482719540807848))
            ThreePointArc((22.092294732095578, 15.482719540807848), (23.15840811564324, 15.30835012203906), (24.237109976232734, 15.25))
        make_face()
    extrude(amount=-BOSS_EXTRUDE5_DEPTH)

    # Sketch26 → Cut-Extrude14 (cut, through all)
    with BuildSketch(Plane.XZ.offset(29.8908)):
        with BuildLine():
            Line((-18.976555851670547, -8.317283119898706), (-13.970450097258862, -30.09899009069905))
            Line((-13.970450097258862, -30.09899009069905), (-30.098990090699047, -13.970450097258864))
            ThreePointArc((-30.098990090699047, -13.970450097258864), (-30.730174977242033, -12.446634983801854), (-30.098990090699044, -10.92281987034485))
            Line((-30.098990090699044, -10.92281987034485), (-27.238674355551726, -8.062504135197523))
            Line((-27.238674355551726, -8.062504135197523), (-18.976555851670547, -8.317283119898706))
        make_face()
    extrude(amount=CUT_EXTRUDE14_DEPTH, mode=Mode.SUBTRACT)

    # Sketch27 → Cut-Extrude15 (cut)
    with BuildSketch(Plane.XZ.offset(29.8908)):
        with Locations(Location((-27.29099835192915, -12.473575752165065, 0), (0, 0, 270))):
            Circle(SKETCH27_R)
        with Locations(Location((-12.47357575216505, -27.290998351929158, 0), (0, 0, 270))):
            Circle(SKETCH27_R)
    extrude(amount=-CUT_EXTRUDE15_DEPTH, mode=Mode.SUBTRACT)

    # Sketch28 → Cut-Extrude16 (cut)
    with BuildSketch(Plane.XZ.offset(29.8908)):
        with Locations(Location((-27.29099835192915, -12.473575752165065, 0), (0, 0, 270))):
            Circle(SKETCH28_R)
        with Locations(Location((-12.47357575216505, -27.290998351929158, 0), (0, 0, 270))):
            Circle(SKETCH28_R_2)
    extrude(amount=-CUT_EXTRUDE16_DEPTH, mode=Mode.SUBTRACT)

    # Fillet5
    # the kernel refuses this fillet: 2.5 mm, written as the material it takes off along each edge
    with BuildSketch(Plane(origin=(-8.165668965896261, -34.068034873717735, -23.89318627432096), x_dir=(-0.9355866460023518, 0, 0.35309719316651356), z_dir=(0, 1, 0))) as fillet5_piece_1:
        with BuildLine():
            CenterArc((1.6727559192968875, -2.498754534741212), FILLET5_R, 91.80863723012877, 65.74822155289536)
            Line((-0.6378911862633408, -1.54433850723217), (0, 0))
            ThreePointArc((0, 0), (0.7969261690989898, -0.0125791991137666), (1.59385233819798, 7e-17))
        make_face()
    extrude(amount=15.854469747435477, mode=Mode.SUBTRACT)
    with BuildSketch(Plane(origin=(-28.819440187957913, -29.8908, -15.249999999999998), x_dir=(-0.5820598075620075, 0, 0.8131459773133474), z_dir=(0, -1, 0))) as fillet5_piece_2:
        with BuildLine():
            CenterArc((4.594416541128744, 2.123375145412493), FILLET5_R, 144.40445067780377, 93.73659766899215)
            Line((2.5615515978453756, 3.578524664317512), (2.3582651035170388, 3.724039616208014))
            Line((2.3582651035170388, 3.724039616208014), (-0.20328649432833684, 0.14551495189050187))
            Line((-0.20328649432833684, 0.14551495189050187), (0.0408506494173984, -0.24663986790901668))
            ThreePointArc((0.0408506494173984, -0.24663986790901668), (1.826086075758527, 0.04904641812113162), (3.142884119812632, -0.21233751454124886))
            Line((3.142884119812632, -0.21233751454124886), (3.274841612659551, 3e-17))
        make_face()
    extrude(amount=16.111297914021037, mode=Mode.SUBTRACT)
    with BuildSketch(Plane(origin=(-23.893186274320946, -29.8908, -8.16566896589627), x_dir=(-0.2624644085594799, 0, 0.9649416740091198), z_dir=(0, -1, 0))) as fillet5_piece_3:
        with BuildLine():
            CenterArc((3.375802522576318, 2.494923627384301), FILLET5_R, 163.59172174149506, 102.75638657572608)
            Line((0.977619595016342, 3.2011237732069016), (0, 0))
            ThreePointArc((0, 0), (1.6082832772651305, 0.05127136341856297), (3.216566554530266, 6e-17))
        make_face()
    extrude(amount=13.476895876087362, mode=Mode.SUBTRACT)

    # Fillet6
    fillet6_edges = [part.edges().sort_by_distance(p)[0] for p in [
        (-28.819440187957916, -26.1408, -15.25),
    ]]
    fillet(fillet6_edges, radius=FILLET6_R)


solid = part.part
